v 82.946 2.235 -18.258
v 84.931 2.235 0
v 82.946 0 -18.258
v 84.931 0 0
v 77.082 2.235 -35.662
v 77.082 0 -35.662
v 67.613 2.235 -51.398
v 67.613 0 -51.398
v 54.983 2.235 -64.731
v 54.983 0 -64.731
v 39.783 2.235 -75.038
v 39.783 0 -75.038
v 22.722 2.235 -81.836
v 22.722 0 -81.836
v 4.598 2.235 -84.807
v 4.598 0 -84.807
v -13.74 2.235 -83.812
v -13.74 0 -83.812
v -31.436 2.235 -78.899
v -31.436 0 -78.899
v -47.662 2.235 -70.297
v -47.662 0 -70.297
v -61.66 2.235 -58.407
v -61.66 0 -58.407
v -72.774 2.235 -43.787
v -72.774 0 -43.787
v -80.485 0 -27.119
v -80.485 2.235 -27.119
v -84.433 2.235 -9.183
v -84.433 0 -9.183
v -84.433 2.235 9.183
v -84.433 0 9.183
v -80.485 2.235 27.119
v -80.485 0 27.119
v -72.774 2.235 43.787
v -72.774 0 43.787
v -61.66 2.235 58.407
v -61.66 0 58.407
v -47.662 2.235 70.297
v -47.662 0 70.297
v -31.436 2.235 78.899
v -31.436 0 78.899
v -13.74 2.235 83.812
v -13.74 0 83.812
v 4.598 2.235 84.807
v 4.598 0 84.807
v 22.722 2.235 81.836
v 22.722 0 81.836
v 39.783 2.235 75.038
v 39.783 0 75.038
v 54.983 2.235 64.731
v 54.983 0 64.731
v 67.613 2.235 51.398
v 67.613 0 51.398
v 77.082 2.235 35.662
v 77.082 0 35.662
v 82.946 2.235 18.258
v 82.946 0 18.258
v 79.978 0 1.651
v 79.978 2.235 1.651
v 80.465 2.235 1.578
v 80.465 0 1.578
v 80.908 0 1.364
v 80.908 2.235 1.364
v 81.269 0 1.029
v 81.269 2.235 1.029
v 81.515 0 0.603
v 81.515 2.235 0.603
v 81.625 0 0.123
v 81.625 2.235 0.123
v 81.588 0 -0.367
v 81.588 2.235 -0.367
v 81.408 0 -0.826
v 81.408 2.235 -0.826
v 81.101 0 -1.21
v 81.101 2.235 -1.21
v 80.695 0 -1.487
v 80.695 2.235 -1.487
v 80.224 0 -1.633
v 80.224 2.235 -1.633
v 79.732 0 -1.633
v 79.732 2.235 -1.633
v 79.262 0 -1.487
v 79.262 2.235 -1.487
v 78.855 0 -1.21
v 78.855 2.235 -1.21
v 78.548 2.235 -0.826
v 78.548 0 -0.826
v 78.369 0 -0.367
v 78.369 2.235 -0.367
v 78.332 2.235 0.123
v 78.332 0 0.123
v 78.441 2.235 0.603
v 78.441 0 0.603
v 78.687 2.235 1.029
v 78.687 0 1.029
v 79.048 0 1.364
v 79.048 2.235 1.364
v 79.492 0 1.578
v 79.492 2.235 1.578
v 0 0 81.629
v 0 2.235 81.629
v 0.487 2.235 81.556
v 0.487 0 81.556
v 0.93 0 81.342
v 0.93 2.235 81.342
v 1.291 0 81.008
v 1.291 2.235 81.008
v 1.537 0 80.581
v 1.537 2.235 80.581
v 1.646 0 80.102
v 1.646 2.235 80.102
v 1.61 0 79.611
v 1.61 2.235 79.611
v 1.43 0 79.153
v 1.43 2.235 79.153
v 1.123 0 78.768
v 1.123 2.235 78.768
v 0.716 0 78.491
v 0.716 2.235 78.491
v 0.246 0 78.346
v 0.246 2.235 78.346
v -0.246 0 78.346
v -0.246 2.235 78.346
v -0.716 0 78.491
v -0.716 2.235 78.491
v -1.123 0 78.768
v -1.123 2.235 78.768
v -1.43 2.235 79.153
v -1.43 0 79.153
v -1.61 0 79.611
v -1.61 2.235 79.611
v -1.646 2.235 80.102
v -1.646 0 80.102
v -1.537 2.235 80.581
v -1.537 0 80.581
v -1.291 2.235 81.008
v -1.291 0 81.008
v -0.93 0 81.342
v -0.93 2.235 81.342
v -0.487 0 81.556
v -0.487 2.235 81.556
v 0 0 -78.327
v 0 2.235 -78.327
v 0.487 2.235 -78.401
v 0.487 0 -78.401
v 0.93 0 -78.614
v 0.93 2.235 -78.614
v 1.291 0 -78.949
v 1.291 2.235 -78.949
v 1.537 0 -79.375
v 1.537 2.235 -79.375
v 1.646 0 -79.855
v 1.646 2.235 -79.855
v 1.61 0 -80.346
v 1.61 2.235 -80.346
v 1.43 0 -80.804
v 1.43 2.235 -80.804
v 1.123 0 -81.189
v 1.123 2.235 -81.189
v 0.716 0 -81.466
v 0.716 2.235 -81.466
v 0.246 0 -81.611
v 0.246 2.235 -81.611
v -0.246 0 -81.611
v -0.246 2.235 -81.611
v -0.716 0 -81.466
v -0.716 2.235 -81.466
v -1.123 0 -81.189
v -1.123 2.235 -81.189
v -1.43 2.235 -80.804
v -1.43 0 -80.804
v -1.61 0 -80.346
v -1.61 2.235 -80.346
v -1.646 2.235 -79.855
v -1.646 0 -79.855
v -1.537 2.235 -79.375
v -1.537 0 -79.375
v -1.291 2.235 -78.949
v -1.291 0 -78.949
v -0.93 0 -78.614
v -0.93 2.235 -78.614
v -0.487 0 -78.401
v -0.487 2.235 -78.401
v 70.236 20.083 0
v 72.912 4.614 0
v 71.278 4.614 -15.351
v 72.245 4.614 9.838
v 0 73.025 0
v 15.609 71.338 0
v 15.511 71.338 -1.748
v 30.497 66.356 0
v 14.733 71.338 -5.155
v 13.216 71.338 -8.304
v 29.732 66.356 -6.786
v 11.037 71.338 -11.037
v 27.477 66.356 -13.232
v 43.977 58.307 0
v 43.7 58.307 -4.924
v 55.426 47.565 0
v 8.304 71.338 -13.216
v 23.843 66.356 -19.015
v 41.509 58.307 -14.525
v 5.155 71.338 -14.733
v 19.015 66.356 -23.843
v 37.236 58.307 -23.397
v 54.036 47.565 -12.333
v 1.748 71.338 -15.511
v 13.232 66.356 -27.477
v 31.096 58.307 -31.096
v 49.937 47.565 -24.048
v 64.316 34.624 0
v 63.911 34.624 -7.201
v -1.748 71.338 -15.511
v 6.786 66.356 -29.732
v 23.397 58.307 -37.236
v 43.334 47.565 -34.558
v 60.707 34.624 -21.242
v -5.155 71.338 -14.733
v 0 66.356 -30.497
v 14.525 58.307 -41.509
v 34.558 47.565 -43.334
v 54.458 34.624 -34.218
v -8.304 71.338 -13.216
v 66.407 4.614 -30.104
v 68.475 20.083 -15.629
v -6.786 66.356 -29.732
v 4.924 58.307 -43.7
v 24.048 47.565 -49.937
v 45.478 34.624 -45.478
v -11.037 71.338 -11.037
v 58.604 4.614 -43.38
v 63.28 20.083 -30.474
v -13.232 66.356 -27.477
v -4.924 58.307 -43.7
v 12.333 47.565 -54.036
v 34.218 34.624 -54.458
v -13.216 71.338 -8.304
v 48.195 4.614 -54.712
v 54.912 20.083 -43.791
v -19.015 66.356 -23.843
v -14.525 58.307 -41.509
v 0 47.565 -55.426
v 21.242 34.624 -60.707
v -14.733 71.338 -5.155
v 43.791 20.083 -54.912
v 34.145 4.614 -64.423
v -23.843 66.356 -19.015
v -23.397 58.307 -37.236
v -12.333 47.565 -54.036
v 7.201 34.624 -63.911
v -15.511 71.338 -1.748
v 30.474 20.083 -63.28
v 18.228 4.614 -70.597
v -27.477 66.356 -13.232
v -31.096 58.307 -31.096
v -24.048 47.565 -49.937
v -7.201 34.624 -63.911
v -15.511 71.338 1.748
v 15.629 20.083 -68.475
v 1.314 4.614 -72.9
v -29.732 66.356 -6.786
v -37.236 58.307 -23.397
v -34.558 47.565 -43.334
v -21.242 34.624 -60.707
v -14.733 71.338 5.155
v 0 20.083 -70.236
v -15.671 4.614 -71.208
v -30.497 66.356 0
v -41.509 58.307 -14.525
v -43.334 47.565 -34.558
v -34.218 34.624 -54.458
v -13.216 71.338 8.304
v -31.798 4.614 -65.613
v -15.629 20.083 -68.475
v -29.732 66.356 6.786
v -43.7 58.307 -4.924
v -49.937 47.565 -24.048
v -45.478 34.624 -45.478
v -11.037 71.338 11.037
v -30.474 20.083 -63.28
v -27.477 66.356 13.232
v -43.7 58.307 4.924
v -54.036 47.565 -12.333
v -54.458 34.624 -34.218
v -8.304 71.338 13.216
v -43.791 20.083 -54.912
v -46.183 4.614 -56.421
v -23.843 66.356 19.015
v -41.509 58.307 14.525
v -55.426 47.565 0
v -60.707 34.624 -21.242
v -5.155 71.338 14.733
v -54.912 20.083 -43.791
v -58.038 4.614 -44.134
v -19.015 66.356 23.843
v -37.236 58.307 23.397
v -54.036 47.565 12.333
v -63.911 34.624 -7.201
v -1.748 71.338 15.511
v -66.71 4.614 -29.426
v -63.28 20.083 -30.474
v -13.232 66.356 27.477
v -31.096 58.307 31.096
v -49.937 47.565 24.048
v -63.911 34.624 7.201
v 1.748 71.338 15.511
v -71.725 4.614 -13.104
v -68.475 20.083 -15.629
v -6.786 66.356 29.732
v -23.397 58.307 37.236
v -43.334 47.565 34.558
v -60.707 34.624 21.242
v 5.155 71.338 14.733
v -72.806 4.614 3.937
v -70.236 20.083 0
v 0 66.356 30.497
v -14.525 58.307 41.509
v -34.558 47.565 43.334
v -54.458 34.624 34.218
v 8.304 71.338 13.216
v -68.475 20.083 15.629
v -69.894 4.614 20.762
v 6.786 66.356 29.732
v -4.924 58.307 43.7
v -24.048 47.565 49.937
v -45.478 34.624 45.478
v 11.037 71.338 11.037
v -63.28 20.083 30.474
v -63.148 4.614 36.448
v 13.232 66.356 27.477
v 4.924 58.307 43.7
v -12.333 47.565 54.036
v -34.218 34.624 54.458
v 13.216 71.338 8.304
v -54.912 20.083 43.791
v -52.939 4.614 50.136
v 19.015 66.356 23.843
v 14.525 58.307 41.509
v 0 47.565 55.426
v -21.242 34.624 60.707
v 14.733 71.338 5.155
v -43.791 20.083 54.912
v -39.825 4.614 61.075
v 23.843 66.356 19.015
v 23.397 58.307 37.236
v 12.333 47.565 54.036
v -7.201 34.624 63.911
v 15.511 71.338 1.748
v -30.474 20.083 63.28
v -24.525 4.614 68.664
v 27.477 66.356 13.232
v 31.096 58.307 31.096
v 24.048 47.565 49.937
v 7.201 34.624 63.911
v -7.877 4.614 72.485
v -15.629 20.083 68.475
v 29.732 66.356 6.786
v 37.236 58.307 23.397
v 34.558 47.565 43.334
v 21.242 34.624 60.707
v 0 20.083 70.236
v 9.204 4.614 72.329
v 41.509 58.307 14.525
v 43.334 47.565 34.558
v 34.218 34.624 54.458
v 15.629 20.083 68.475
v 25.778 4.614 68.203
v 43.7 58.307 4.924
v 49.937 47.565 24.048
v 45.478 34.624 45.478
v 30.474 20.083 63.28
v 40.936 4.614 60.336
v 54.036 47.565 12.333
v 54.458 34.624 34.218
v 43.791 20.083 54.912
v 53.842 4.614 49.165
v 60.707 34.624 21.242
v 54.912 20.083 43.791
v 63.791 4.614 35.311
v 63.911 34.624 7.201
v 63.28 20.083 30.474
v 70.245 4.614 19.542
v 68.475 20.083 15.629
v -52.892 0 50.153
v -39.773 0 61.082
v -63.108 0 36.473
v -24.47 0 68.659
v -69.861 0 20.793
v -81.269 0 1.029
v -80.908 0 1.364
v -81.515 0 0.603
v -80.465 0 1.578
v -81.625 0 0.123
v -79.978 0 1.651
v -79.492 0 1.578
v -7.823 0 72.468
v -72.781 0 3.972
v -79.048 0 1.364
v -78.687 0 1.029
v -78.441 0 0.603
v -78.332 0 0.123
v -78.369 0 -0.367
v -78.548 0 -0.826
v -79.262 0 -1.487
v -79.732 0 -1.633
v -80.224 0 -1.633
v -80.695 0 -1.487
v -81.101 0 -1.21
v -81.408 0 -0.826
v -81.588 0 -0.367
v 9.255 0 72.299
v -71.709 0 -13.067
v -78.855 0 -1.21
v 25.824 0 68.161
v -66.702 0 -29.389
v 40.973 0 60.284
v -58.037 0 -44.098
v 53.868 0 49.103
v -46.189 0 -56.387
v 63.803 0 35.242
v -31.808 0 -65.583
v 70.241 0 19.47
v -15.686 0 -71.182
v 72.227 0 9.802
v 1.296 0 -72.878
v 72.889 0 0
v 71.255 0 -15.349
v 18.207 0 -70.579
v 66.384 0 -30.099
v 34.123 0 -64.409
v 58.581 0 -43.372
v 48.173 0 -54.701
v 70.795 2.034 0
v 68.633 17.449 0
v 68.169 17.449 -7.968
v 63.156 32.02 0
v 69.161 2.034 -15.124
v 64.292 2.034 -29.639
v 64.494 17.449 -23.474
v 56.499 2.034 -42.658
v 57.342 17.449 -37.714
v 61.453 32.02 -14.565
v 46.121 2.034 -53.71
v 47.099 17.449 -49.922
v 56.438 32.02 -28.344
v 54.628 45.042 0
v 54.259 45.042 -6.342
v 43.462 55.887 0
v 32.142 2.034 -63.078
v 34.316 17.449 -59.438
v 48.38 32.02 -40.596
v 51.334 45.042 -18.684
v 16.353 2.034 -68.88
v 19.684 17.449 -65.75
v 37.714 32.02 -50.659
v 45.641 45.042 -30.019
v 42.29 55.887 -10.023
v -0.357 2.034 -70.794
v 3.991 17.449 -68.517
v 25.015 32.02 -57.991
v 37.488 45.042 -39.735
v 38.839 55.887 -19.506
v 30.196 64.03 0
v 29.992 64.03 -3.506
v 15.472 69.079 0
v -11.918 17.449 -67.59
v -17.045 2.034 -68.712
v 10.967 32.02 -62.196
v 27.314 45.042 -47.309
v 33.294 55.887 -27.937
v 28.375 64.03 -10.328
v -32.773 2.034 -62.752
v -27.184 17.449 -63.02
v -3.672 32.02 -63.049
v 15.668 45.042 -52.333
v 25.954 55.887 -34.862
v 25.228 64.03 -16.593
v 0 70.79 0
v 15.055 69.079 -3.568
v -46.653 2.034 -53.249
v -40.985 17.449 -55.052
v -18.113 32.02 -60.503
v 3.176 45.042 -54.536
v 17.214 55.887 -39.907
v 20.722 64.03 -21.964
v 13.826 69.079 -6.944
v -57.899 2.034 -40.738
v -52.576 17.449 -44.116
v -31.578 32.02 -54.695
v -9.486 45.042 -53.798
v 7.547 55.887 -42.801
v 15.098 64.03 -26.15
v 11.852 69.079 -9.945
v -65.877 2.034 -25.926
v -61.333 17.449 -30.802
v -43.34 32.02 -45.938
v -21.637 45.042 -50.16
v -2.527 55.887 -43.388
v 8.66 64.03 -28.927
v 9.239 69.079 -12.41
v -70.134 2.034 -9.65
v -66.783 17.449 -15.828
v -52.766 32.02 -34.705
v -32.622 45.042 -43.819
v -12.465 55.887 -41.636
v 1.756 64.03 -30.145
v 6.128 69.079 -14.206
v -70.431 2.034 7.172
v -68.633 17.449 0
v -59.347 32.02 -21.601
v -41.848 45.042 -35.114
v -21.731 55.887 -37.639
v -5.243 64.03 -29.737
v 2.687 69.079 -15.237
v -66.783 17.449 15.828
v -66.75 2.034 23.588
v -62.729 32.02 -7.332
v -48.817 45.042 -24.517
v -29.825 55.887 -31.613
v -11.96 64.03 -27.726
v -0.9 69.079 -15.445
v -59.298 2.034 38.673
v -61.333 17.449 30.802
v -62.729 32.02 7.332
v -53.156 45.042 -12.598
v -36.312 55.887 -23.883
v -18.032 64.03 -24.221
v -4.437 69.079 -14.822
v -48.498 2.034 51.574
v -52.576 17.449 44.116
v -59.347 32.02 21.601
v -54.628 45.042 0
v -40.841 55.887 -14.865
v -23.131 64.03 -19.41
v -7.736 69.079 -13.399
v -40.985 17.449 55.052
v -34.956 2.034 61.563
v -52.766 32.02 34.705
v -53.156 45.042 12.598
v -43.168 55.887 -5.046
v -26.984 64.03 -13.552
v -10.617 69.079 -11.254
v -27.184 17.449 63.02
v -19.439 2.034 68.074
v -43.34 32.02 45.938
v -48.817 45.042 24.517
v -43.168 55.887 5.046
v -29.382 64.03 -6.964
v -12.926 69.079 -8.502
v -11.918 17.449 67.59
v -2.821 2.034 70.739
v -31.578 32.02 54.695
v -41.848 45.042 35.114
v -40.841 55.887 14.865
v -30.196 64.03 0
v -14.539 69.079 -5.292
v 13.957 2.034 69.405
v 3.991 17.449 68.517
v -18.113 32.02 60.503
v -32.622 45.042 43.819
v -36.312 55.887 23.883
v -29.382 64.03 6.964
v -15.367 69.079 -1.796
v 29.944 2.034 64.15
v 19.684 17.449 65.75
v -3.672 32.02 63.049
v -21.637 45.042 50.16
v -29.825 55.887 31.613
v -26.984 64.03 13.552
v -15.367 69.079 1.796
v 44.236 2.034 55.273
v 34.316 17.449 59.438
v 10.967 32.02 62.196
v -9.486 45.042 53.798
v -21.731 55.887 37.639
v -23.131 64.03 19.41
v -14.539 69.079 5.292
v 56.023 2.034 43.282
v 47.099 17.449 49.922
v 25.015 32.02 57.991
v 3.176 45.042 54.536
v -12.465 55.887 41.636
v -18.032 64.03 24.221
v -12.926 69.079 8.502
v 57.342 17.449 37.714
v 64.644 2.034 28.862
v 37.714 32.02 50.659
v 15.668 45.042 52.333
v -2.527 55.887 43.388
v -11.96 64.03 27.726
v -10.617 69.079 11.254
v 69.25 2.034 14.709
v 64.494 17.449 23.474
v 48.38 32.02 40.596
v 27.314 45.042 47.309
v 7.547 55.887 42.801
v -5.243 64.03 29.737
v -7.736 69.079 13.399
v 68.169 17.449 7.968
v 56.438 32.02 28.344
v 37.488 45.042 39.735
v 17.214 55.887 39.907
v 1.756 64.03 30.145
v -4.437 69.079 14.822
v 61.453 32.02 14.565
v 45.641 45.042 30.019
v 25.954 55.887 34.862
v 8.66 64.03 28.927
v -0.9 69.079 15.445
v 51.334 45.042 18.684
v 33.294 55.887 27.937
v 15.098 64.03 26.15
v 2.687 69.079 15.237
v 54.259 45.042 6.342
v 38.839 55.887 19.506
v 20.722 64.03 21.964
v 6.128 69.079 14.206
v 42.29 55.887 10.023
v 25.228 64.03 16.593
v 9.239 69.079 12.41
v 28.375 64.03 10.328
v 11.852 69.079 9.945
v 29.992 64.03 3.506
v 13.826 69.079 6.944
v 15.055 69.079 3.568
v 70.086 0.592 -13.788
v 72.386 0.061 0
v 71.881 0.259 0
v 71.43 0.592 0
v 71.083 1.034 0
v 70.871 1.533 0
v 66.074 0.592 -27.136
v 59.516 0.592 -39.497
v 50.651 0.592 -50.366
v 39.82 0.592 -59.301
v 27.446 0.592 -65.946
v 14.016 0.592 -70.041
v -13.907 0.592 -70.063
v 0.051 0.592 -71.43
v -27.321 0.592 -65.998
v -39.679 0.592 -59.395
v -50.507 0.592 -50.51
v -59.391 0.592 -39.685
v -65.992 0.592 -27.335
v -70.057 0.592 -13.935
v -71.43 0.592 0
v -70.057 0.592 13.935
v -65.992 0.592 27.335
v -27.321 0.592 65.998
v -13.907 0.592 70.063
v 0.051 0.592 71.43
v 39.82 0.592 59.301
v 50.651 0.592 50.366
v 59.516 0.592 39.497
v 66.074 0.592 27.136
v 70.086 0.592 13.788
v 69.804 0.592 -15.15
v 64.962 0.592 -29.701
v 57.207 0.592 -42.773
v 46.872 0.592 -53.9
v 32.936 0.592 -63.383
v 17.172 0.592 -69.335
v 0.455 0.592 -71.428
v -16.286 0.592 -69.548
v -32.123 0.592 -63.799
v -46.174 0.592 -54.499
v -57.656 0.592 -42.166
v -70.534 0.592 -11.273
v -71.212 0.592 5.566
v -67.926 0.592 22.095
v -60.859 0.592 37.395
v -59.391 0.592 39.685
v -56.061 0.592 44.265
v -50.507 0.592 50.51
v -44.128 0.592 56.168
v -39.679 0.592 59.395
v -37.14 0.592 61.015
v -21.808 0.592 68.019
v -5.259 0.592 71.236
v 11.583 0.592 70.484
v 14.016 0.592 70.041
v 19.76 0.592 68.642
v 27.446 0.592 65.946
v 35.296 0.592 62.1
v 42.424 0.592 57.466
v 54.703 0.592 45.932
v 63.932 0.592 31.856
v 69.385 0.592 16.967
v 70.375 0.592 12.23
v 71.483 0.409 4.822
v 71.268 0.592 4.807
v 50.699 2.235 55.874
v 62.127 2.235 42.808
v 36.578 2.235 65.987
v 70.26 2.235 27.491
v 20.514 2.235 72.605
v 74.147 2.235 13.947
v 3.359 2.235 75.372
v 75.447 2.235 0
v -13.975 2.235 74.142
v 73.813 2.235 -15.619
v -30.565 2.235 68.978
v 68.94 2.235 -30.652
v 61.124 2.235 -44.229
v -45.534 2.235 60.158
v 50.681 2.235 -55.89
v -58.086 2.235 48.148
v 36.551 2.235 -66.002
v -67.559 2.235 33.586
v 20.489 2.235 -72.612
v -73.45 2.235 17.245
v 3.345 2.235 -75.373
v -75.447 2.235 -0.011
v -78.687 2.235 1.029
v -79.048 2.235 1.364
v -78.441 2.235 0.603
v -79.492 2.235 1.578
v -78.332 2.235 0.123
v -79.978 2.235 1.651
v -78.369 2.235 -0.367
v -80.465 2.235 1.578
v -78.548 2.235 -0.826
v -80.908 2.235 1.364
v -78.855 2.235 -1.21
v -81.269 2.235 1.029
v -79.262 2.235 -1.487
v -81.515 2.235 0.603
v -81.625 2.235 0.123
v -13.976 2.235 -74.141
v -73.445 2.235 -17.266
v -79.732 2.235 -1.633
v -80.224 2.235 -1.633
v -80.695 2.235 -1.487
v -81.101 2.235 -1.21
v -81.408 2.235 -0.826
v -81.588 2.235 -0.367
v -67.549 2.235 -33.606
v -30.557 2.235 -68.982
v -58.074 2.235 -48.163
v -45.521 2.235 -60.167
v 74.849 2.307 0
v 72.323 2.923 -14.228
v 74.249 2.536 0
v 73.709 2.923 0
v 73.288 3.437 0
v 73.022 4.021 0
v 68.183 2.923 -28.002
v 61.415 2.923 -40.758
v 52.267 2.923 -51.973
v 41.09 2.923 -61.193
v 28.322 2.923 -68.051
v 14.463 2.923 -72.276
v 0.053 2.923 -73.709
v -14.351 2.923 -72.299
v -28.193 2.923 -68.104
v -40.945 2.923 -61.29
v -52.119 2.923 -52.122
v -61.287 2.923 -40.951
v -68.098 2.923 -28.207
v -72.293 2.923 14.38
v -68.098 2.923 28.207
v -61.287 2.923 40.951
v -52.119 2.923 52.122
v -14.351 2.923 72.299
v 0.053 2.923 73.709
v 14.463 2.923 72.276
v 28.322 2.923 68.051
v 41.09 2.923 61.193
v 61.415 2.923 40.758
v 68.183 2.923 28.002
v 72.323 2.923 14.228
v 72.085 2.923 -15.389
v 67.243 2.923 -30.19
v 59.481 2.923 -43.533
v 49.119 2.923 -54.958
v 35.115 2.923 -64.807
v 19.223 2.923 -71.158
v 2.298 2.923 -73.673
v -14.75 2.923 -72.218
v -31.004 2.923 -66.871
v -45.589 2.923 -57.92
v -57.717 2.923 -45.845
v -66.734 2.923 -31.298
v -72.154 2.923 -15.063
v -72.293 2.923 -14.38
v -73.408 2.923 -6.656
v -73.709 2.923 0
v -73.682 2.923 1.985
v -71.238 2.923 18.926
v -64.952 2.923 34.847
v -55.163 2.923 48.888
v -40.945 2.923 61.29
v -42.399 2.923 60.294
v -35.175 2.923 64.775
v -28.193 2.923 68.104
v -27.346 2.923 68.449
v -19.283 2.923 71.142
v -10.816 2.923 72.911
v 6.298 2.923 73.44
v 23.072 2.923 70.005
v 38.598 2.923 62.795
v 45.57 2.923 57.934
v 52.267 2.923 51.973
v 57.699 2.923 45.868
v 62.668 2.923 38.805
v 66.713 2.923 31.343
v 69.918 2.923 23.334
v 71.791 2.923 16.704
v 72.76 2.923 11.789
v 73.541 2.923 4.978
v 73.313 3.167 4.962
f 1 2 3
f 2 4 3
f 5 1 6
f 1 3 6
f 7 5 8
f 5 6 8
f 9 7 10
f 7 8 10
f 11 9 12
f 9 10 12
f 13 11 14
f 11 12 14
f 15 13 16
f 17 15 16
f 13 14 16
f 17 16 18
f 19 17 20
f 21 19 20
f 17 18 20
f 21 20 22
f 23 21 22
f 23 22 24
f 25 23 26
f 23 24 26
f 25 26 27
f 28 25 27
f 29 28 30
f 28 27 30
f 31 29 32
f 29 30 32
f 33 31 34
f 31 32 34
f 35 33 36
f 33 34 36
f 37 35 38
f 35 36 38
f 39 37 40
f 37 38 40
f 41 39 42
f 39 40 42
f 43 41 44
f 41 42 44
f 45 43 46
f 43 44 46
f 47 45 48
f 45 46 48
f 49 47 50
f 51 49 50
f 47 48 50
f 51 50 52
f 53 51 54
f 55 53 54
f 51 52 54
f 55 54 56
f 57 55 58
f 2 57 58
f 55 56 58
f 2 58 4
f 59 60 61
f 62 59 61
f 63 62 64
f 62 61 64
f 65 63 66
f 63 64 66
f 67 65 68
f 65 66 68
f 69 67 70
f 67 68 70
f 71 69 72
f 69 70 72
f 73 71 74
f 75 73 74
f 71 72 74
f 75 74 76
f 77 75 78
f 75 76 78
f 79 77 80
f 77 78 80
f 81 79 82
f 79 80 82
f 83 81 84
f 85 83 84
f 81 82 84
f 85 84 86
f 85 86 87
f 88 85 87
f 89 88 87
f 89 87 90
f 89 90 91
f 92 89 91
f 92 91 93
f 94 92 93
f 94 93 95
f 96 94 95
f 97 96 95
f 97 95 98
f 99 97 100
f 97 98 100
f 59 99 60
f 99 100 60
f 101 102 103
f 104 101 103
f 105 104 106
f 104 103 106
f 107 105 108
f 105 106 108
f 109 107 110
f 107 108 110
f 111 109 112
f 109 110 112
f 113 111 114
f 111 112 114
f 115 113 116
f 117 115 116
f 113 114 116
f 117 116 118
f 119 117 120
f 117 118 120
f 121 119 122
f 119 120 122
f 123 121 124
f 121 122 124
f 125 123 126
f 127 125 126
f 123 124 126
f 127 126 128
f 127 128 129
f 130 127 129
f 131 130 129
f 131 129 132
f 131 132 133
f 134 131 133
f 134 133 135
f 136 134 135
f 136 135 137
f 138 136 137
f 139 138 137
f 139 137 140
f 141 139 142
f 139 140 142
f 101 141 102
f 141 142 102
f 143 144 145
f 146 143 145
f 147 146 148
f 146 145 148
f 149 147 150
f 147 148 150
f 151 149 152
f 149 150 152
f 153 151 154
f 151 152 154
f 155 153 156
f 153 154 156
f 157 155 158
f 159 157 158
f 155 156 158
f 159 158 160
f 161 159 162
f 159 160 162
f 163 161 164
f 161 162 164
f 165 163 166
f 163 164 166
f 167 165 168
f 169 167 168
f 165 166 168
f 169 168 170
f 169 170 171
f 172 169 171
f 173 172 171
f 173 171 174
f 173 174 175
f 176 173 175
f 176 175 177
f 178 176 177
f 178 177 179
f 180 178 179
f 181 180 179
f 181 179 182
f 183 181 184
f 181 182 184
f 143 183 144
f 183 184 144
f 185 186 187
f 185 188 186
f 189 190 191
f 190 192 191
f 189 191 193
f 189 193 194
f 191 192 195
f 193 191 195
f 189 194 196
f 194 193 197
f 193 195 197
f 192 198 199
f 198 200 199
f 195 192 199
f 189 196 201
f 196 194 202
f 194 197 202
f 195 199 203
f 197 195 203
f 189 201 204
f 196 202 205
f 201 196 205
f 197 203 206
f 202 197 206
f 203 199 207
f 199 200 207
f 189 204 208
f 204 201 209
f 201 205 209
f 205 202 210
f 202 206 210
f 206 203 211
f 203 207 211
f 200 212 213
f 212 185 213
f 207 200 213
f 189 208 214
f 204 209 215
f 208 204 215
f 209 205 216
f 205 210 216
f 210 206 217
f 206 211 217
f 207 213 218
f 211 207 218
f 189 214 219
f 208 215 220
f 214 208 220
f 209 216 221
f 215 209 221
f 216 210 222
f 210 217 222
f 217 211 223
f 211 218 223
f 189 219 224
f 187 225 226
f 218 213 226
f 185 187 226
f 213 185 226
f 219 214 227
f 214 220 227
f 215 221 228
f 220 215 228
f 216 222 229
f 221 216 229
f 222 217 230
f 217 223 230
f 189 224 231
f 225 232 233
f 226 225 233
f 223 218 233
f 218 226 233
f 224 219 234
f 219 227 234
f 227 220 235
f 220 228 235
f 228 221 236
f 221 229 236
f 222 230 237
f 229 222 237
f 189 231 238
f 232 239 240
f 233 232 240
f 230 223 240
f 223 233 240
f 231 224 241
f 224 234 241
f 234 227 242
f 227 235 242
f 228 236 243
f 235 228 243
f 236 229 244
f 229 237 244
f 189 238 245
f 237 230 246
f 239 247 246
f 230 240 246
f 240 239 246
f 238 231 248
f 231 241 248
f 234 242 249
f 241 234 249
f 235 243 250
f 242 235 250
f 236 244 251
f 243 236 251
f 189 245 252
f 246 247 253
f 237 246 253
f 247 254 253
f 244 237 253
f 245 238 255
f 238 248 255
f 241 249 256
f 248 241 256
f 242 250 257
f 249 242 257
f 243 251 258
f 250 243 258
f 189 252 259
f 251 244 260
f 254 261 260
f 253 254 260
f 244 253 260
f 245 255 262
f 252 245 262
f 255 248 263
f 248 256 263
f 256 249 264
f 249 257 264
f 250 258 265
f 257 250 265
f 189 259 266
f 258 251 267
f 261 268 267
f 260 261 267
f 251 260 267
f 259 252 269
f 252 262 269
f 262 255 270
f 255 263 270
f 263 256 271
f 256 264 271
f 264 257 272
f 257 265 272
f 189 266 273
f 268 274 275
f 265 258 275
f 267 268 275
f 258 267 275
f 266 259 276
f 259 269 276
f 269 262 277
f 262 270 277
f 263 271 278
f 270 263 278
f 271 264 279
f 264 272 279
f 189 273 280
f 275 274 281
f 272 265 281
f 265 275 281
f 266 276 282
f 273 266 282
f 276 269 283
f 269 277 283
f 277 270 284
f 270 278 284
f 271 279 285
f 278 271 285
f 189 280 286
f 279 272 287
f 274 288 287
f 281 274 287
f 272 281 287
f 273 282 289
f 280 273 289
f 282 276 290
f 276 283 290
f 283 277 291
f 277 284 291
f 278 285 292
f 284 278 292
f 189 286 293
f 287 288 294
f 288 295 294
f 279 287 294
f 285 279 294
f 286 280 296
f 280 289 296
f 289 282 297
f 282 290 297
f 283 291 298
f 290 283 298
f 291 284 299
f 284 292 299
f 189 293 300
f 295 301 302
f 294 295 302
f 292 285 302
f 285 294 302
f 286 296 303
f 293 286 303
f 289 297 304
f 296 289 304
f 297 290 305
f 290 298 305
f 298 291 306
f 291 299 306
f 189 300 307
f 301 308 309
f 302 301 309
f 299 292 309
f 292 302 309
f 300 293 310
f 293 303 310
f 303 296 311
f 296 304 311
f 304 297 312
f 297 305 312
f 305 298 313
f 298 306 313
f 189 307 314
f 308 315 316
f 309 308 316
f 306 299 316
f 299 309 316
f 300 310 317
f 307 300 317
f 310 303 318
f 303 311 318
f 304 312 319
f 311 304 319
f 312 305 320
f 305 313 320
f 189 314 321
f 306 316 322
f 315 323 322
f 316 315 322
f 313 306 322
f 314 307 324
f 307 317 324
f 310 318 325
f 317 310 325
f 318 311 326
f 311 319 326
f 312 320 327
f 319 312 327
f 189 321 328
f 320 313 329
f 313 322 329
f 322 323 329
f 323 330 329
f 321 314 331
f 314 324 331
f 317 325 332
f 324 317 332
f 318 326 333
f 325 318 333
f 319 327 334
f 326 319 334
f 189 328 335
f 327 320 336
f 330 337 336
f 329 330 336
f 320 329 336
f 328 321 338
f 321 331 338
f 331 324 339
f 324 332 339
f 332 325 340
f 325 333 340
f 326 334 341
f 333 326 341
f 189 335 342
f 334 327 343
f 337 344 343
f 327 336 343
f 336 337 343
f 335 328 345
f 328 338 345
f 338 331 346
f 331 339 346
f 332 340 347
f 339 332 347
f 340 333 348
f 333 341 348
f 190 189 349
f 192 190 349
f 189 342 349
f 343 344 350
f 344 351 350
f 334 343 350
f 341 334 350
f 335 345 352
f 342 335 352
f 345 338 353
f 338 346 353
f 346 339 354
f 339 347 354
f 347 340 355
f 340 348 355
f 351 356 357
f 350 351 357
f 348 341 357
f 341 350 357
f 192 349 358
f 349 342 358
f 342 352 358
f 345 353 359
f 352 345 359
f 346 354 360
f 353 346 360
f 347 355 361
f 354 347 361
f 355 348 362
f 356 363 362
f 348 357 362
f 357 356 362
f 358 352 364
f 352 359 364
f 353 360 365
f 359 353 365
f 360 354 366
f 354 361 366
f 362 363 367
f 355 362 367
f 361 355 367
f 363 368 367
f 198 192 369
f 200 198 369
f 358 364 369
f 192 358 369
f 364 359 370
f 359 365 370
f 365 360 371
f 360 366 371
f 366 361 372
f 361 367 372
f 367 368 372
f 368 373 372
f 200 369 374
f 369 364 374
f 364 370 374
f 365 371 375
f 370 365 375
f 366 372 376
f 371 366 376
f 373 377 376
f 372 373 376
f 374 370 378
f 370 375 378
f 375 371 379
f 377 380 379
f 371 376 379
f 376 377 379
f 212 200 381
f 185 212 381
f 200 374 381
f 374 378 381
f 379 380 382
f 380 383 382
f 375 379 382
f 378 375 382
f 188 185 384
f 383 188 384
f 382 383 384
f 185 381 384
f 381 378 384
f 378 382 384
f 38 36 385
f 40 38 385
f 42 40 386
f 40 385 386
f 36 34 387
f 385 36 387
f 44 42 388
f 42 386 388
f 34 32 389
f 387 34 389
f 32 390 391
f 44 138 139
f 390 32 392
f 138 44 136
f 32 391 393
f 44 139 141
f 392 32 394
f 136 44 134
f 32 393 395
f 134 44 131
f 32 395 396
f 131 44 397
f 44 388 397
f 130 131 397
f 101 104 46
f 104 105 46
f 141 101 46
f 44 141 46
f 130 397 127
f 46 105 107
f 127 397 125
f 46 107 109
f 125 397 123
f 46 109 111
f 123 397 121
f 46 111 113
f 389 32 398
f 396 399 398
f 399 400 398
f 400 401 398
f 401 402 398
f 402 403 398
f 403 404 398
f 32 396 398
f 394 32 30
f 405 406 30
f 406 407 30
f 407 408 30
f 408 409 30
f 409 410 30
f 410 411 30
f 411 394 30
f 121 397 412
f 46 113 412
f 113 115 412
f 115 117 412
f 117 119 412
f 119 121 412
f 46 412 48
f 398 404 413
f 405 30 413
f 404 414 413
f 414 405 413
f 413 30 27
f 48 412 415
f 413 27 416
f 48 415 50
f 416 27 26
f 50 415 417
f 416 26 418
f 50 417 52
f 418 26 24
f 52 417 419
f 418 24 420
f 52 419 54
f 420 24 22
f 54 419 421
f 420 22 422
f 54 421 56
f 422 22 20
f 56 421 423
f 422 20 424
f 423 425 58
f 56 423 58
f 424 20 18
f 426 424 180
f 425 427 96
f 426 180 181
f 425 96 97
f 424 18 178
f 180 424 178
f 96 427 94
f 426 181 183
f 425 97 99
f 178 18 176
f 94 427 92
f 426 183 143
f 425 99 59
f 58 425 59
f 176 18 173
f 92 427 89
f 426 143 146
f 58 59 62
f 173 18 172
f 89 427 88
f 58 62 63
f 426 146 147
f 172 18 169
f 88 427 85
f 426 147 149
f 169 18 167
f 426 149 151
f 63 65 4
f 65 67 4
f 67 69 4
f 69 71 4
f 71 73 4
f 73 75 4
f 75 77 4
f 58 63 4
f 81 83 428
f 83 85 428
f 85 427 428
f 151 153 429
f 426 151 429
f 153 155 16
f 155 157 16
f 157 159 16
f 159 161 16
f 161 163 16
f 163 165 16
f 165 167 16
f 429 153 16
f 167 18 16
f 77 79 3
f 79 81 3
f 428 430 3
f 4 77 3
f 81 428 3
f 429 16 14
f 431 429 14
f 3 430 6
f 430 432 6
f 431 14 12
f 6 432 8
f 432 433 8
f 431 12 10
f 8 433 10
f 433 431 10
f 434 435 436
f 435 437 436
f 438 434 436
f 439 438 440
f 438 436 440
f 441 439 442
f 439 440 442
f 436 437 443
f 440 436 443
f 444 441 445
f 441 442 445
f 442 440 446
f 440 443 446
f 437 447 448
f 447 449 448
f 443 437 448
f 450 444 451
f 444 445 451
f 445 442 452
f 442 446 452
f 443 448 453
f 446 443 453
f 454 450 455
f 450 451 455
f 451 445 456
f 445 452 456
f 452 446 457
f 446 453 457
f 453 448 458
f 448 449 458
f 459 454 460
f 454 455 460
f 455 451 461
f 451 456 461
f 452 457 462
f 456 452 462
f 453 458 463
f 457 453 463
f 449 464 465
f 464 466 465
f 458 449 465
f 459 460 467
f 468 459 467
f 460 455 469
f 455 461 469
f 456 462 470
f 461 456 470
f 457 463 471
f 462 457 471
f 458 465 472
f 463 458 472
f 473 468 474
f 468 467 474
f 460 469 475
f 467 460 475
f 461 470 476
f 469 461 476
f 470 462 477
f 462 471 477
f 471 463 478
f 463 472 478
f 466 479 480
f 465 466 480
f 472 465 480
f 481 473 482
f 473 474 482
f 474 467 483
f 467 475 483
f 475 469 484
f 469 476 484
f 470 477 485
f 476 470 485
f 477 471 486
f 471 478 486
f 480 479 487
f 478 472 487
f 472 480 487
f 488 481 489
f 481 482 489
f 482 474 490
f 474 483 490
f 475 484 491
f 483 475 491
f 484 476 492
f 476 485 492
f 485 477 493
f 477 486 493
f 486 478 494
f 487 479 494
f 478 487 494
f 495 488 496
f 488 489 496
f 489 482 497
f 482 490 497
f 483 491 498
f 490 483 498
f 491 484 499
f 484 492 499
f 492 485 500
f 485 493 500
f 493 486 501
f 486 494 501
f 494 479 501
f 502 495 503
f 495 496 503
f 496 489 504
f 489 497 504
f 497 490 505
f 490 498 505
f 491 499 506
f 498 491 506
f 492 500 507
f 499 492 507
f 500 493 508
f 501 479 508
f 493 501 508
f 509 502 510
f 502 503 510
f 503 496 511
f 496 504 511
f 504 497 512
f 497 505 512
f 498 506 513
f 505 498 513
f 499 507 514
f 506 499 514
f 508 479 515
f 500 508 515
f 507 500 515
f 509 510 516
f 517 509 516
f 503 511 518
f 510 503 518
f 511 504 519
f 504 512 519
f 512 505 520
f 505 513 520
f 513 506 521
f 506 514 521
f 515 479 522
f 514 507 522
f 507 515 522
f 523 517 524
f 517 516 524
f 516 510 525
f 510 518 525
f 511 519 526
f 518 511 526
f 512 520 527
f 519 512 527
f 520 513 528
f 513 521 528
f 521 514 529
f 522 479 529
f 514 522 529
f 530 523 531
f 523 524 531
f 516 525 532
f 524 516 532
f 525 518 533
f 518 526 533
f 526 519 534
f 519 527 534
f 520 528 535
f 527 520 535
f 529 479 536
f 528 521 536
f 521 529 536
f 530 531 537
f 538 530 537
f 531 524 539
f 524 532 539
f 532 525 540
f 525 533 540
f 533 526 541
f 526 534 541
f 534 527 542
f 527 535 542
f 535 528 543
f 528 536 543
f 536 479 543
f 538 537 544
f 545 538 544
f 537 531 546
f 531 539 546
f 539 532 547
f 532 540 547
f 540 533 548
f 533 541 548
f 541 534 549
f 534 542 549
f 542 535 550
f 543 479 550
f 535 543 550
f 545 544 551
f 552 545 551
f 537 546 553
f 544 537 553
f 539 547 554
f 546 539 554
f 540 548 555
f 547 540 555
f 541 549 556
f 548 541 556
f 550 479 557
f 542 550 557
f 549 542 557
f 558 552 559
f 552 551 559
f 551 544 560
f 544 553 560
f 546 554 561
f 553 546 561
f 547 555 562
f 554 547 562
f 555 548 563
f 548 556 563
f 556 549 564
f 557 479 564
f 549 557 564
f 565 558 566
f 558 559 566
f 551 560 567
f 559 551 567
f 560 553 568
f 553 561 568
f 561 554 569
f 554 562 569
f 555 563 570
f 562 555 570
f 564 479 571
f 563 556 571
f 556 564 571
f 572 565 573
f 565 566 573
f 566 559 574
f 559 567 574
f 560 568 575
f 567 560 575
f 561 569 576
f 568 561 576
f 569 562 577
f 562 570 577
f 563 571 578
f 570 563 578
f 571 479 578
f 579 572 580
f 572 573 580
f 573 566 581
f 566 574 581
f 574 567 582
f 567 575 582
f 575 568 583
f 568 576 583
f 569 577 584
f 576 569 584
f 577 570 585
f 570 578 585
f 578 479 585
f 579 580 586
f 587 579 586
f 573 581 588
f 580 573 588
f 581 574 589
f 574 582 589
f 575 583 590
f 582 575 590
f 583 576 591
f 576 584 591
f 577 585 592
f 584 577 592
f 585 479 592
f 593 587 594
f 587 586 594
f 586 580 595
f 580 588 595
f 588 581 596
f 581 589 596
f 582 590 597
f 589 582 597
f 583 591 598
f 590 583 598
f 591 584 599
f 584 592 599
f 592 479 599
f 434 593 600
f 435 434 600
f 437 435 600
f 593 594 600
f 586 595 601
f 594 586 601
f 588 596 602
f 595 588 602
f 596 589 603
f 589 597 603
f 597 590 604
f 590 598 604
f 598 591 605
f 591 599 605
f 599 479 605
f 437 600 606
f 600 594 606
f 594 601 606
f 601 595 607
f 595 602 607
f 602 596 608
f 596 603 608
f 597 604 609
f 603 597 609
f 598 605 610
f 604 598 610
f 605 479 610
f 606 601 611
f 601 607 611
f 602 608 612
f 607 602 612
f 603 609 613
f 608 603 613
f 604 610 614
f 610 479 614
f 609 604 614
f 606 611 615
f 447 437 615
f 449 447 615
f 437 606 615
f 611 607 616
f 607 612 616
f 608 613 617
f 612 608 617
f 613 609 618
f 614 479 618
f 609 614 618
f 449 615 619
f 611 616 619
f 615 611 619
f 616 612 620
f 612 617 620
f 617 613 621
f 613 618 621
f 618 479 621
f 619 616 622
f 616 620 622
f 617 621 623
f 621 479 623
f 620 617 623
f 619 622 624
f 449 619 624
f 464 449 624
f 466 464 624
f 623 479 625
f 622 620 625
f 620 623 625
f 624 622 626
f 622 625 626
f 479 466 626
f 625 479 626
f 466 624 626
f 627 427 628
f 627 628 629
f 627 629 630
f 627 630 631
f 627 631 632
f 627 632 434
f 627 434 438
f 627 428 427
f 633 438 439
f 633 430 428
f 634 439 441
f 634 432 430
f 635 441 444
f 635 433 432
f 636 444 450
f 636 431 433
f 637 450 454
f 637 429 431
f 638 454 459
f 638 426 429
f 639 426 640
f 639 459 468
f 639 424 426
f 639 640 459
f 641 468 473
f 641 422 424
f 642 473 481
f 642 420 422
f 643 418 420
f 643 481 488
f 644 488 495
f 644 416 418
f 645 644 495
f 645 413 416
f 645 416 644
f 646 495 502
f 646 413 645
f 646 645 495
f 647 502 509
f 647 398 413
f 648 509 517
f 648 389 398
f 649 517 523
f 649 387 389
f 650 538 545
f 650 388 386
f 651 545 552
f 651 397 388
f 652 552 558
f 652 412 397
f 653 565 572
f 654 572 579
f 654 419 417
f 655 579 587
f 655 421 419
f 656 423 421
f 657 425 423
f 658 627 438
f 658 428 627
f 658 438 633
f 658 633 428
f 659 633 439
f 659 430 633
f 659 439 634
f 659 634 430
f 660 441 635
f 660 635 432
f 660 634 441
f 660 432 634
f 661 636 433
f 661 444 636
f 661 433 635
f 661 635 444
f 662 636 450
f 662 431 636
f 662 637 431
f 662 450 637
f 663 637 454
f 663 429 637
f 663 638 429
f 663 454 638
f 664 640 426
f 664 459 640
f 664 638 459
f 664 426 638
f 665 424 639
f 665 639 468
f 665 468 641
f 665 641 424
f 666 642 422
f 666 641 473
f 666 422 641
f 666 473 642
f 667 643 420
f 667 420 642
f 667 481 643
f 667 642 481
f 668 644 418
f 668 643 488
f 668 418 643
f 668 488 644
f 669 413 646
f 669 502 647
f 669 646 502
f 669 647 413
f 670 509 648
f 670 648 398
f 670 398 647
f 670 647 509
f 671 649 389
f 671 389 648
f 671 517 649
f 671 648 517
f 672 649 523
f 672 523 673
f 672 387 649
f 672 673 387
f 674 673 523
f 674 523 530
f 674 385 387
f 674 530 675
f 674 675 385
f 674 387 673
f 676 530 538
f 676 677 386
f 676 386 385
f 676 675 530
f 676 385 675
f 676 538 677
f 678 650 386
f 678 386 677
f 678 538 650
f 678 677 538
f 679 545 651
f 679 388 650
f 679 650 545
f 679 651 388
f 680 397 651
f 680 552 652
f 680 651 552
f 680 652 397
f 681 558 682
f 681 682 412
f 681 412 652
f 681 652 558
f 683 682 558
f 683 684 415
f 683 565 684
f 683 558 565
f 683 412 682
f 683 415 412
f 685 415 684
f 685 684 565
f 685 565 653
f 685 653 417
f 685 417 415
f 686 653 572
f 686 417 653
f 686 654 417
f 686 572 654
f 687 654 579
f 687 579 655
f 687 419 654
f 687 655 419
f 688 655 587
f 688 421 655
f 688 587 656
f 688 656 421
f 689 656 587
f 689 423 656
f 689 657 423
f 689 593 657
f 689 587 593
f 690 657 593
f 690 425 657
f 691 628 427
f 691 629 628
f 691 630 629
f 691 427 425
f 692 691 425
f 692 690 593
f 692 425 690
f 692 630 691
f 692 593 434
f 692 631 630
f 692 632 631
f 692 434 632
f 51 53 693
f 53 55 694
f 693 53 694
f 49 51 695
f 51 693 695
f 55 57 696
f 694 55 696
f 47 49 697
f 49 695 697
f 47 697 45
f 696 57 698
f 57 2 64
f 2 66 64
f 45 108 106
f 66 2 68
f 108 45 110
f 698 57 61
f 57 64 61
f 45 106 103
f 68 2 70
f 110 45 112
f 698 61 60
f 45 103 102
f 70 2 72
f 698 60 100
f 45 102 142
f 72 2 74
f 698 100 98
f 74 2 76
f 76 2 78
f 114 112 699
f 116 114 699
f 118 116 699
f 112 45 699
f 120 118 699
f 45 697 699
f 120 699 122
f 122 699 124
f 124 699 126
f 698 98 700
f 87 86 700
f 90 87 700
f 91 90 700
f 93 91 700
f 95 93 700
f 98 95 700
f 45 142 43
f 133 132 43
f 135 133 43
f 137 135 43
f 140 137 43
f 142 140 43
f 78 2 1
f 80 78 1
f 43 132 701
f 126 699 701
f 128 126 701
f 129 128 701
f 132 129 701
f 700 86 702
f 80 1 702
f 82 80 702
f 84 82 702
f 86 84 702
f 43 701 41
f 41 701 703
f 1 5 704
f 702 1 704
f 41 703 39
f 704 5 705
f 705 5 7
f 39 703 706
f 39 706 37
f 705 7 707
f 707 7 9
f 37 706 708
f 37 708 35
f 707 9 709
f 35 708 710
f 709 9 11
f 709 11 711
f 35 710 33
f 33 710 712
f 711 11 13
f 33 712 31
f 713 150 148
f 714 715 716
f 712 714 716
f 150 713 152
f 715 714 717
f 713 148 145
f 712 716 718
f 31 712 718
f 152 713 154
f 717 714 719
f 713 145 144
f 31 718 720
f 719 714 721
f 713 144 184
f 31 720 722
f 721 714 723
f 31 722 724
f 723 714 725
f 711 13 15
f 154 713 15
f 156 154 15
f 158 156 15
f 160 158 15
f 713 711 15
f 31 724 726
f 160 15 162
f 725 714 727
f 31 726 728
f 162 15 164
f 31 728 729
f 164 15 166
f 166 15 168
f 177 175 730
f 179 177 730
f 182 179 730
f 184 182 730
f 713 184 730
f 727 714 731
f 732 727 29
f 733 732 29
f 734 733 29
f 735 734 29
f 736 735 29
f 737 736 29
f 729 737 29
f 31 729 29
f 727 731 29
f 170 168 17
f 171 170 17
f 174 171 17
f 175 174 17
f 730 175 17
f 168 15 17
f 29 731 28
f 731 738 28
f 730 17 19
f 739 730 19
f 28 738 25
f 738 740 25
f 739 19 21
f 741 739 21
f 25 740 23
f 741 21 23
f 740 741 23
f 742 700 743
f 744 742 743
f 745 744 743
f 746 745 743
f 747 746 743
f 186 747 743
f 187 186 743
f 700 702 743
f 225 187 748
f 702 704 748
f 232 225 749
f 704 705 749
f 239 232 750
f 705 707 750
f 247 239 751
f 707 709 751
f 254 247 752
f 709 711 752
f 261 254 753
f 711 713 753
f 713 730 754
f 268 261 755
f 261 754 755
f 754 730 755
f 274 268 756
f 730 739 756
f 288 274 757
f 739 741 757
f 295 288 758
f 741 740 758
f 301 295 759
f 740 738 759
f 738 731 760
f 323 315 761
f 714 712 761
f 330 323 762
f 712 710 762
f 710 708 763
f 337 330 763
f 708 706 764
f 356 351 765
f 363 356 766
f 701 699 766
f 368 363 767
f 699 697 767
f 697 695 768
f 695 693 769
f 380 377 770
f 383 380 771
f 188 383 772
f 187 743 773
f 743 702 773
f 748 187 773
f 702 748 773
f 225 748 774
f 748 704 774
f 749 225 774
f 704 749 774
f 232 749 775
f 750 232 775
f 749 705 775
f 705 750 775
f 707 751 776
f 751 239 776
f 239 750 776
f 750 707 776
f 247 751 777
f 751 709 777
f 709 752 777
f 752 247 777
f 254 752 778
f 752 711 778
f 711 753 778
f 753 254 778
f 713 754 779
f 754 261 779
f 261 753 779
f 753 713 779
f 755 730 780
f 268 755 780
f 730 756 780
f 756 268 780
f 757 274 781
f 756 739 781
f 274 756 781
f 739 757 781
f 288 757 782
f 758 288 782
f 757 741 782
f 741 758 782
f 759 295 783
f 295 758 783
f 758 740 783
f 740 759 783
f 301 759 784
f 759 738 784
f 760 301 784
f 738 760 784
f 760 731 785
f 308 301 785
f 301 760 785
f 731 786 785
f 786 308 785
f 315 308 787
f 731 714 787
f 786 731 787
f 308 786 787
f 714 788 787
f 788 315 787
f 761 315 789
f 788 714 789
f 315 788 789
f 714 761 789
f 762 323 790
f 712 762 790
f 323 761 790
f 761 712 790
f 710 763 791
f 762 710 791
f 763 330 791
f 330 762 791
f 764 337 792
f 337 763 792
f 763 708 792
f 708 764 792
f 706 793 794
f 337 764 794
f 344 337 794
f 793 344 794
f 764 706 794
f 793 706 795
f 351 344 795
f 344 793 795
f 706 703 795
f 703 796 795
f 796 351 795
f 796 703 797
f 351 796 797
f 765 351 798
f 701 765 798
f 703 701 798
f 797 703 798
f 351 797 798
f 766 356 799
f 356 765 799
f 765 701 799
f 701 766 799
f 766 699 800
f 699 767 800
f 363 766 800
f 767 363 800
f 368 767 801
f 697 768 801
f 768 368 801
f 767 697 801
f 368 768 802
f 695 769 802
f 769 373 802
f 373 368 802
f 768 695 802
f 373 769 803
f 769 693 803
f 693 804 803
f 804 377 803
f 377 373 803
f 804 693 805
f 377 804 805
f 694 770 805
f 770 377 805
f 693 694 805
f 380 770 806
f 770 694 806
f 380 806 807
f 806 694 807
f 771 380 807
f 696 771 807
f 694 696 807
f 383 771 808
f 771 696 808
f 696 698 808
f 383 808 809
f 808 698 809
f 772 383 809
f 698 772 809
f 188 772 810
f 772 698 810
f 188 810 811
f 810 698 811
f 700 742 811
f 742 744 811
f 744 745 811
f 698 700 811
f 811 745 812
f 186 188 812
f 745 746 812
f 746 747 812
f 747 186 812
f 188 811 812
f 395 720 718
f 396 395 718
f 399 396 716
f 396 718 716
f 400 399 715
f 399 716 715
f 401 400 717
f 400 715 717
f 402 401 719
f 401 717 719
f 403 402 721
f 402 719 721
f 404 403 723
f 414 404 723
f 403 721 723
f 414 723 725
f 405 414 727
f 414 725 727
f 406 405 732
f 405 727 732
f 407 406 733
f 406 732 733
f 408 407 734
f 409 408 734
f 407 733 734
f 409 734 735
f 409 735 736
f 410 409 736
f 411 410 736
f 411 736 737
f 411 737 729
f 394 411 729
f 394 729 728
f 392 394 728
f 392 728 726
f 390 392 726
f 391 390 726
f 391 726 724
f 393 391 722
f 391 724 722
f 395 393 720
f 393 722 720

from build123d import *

# Parameters (mm, degrees)
SKETCH2_R        = 1.651
DOME_HOLES_DEPTH = 2.2352
FILLET1_R        = 2.0955
FILLET2_R        = 2.54


# Read off the part's stored shape, not the designer's step: Shell1
with BuildPart() as part:
    # Sketch1 → Revolve1 (revolve)
    with BuildSketch(Plane.XY):
        with BuildLine():
            Line((0, 0), (0, 73.025))
            ThreePointArc((0, 73.025), (50.852351, 52.42273424), (73.025, 2.2352))
            Line((73.025, 2.2352), (84.93125, 2.2352))
            Line((84.93125, 2.2352), (84.93125, 0))
            Line((84.93125, 0), (0, 0))
        make_face()
    revolve(axis=Axis((0, 0, 0), (0, 1, 0)))

    # Shell1 outline → Shell1 (revolve, cut)
    with BuildSketch(Plane.XY):
        with BuildLine():
            Line((0, -7.1e-08), (70.825079619, -7.1e-08))
            ThreePointArc((70.825079619, -7.1e-08), (50.068422427, 50.058086641), (0, 70.7898))
            Line((0, 70.7898), (0, -7.1e-08))
        make_face()
    revolve(axis=Axis((0, 0, 0), (0, 1, 0)), mode=Mode.SUBTRACT)

    # Sketch2 → Dome Holes (cut)
    with BuildSketch(Plane(origin=(0, 2.2352, 0), x_dir=(1, 0, 0), z_dir=(0, 1, 0))):
        with Locations(Location((0, 79.97825, 0), (0, 0, 270))):
            Circle(SKETCH2_R)
        with Locations(Location((79.97825, 0, 0), (0, 0, 270))):
            Circle(SKETCH2_R)
        with Locations(Location((0, -79.97825, 0), (0, 0, 270))):
            Circle(SKETCH2_R)
        with Locations(Location((-79.97825, 0, 0), (0, 0, 270))):
            Circle(SKETCH2_R)
    extrude(amount=-DOME_HOLES_DEPTH, mode=Mode.SUBTRACT)

    # Fillet1
    fillet1_edges = [part.edges().sort_by_distance(p)[0] for p in [
        (-70.825079619, -7.1e-08, 0),
    ]]
    fillet(fillet1_edges, radius=FILLET1_R)

    # Fillet2
    fillet2_edges = [part.edges().sort_by_distance(p)[0] for p in [
        (-73.025, 2.2352, 0),
    ]]
    fillet(fillet2_edges, radius=FILLET2_R)


solid = part.part
